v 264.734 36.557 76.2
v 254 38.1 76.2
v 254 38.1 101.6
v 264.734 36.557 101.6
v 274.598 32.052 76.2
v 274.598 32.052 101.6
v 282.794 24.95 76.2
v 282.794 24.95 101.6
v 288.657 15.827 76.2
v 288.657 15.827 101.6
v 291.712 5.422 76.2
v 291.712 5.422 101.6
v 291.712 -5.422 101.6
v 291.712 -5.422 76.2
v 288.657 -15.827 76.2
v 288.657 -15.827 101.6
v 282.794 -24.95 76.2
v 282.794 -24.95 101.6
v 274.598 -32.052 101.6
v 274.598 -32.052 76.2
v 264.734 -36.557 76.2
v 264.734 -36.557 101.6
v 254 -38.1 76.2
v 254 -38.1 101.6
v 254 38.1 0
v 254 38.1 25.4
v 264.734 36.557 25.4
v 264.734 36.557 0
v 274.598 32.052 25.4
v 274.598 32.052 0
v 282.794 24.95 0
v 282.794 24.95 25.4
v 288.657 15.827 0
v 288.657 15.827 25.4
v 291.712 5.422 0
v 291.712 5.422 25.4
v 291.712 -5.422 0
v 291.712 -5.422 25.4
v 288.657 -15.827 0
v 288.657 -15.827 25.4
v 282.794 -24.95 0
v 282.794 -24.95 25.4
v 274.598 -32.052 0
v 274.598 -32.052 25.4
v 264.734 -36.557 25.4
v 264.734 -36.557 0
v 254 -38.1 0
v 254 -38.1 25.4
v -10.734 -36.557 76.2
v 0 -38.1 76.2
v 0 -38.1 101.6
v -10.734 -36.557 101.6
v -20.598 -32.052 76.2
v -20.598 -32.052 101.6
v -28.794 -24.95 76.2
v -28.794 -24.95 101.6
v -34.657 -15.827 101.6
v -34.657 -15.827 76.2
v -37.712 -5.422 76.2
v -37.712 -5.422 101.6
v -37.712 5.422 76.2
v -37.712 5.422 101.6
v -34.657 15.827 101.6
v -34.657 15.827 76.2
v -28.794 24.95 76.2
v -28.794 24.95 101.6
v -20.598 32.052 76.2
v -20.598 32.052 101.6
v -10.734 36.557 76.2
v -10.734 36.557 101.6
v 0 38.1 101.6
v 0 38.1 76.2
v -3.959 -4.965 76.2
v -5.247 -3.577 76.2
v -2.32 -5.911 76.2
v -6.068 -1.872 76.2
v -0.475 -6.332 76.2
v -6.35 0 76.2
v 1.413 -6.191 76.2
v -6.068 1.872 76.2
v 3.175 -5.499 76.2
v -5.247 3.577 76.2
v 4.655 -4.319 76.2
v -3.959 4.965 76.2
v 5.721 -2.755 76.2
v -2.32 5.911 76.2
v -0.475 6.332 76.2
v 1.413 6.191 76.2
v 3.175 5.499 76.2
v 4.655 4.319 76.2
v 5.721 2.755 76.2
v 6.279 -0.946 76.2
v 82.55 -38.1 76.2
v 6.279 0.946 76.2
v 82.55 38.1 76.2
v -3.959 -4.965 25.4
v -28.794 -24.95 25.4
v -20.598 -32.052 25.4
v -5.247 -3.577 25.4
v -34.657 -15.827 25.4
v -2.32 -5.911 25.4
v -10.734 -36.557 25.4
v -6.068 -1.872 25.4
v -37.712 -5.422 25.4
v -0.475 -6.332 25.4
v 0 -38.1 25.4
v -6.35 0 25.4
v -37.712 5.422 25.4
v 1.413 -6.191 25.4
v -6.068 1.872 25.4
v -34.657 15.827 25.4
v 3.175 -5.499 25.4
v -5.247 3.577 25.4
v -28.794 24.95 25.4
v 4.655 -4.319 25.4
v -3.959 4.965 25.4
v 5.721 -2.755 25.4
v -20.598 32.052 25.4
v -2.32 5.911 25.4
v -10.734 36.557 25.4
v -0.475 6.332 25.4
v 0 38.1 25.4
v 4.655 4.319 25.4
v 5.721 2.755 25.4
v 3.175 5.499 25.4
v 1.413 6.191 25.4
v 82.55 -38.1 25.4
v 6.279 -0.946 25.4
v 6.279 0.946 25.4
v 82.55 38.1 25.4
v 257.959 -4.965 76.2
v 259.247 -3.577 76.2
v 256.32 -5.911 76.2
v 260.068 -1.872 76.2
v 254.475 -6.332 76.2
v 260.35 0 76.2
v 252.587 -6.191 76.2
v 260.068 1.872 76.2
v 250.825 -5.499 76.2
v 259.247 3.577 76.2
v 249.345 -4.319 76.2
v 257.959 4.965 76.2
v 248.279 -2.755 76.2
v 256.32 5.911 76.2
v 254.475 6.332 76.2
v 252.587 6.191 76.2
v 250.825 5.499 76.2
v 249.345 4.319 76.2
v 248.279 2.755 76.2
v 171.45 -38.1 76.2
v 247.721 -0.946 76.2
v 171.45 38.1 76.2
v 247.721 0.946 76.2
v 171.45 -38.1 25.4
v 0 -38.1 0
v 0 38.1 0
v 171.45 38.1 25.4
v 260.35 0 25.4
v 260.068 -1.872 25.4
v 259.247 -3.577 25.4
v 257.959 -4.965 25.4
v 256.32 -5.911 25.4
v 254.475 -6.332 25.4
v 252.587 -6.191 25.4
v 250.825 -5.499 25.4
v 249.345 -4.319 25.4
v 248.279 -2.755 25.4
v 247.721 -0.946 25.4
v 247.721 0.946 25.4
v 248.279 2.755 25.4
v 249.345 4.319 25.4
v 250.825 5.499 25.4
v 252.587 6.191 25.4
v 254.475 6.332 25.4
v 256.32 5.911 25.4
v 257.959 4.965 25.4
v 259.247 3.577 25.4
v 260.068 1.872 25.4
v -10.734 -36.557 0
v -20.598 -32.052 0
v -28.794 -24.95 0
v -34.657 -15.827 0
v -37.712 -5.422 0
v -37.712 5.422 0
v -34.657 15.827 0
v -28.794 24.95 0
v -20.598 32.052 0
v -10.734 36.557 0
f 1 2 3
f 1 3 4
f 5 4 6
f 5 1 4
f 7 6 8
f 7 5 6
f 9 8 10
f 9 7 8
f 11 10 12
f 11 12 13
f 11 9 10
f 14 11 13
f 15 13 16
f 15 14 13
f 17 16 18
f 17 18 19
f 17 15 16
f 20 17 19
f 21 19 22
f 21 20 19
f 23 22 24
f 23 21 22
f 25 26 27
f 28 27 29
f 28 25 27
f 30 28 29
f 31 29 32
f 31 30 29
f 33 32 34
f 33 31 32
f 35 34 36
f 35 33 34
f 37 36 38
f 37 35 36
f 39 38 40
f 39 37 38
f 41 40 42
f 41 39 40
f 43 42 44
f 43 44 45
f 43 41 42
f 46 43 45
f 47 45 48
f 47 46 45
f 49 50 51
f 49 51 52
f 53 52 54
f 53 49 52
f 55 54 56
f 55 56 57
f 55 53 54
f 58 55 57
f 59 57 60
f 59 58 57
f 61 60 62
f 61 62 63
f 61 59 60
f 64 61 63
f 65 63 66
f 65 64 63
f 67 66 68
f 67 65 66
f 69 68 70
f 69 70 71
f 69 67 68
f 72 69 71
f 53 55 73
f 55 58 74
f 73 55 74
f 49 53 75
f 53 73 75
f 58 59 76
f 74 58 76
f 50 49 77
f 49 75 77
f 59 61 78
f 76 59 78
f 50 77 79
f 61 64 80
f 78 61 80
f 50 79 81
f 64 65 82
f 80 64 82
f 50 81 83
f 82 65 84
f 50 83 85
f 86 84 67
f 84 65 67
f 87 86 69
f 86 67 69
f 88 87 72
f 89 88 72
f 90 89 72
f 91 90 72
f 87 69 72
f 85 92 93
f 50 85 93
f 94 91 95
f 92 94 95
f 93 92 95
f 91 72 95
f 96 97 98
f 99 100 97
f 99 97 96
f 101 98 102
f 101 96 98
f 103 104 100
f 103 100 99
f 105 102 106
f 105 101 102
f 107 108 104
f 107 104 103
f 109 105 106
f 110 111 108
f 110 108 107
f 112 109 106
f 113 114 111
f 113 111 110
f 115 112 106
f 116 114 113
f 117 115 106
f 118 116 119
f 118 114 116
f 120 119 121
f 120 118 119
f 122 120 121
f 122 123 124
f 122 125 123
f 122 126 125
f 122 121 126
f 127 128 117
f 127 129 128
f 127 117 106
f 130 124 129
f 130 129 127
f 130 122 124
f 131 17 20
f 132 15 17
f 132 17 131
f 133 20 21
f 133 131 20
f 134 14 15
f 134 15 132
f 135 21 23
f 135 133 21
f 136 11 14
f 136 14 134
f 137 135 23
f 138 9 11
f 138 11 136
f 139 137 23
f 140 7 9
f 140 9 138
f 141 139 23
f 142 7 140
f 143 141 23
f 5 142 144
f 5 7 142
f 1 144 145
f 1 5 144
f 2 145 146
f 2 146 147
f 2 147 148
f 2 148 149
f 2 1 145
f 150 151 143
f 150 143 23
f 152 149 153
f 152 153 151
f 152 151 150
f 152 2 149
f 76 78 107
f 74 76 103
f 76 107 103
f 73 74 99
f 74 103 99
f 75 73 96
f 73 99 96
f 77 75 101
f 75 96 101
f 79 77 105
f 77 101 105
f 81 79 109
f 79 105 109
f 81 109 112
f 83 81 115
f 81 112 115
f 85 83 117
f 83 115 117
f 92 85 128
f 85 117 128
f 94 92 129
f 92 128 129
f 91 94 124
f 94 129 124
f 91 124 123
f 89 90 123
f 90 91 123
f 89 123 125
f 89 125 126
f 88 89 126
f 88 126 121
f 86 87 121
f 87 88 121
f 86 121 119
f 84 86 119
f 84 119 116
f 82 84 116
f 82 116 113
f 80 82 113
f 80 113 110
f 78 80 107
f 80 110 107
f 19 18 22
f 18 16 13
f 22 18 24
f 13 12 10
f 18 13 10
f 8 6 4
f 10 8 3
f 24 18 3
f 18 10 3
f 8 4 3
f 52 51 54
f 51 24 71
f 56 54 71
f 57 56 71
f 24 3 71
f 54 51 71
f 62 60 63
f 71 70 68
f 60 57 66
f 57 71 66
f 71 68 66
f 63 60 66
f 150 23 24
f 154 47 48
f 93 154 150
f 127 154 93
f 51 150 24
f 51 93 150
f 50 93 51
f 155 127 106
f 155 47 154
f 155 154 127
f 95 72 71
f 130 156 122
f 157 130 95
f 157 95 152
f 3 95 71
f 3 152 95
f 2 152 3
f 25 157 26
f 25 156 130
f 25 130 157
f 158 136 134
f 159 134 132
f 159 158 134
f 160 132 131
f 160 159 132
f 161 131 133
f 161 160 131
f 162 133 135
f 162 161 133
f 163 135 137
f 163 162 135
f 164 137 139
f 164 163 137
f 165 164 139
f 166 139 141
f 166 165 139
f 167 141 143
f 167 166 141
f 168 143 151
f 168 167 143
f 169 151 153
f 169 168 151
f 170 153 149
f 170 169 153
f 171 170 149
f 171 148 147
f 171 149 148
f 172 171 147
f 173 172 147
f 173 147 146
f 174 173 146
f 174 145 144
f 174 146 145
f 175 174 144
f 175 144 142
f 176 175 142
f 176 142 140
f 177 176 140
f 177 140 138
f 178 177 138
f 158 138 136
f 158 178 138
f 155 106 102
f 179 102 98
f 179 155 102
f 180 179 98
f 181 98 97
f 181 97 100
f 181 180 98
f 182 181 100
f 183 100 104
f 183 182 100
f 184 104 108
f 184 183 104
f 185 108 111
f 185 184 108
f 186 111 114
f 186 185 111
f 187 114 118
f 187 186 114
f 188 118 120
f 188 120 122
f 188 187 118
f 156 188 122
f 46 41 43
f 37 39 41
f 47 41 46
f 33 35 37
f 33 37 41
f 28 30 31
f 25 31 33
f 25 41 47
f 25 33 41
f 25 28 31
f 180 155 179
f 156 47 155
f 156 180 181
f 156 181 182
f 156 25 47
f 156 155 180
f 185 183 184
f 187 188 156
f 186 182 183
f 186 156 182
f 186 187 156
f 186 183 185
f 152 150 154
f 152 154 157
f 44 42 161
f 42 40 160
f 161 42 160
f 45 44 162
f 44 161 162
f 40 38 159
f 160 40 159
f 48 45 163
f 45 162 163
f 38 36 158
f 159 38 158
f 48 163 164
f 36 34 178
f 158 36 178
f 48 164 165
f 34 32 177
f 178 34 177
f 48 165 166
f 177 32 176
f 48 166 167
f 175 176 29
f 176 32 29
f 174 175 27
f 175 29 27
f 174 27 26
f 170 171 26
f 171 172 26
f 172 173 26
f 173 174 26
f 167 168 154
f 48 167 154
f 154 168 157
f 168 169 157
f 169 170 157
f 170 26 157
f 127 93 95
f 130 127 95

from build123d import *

# Parameters (mm, degrees)
BOSS_EXTRUDE1_DEPTH = 101.6
CUT_EXTRUDE1_START  = -25.4
SKETCH3_W           = 165.1
SKETCH3_H           = 76.2
CUT_EXTRUDE1_DEPTH  = 50.8
BOSS_EXTRUDE2_REACH = 306.27
SKETCH6_R           = 6.35


with BuildPart() as part:
    # Sketch1 → Boss-Extrude1 (new body)
    with BuildSketch(Plane.XY):
        with BuildLine():
            Line((0, 38.1), (254, 38.1))
            ThreePointArc((254, 38.1), (292.1, 0), (254, -38.1))
            Line((254, -38.1), (0, -38.1))
            ThreePointArc((0, -38.1), (-38.1, 0), (0, 38.1))
        make_face()
    extrude(amount=BOSS_EXTRUDE1_DEPTH)

    # Sketch3 → Cut-Extrude1 (cut)
    with BuildSketch(Plane.XY.offset(101.6).offset(CUT_EXTRUDE1_START)):
        Rectangle(SKETCH3_W, SKETCH3_H)
    cut_extrude1 = extrude(amount=-CUT_EXTRUDE1_DEPTH, mode=Mode.SUBTRACT)

    # Mirror1: Cut-Extrude1 across plane
    add(cut_extrude1.mirror(Plane(origin=(127, 0, 0), x_dir=(0, 0, 1), z_dir=(1, 0, 0))), mode=Mode.SUBTRACT)

    # Sketch6 → Boss-Extrude2 (add, up to next)
    with BuildSketch(Plane.XY.offset(25.4), mode=Mode.PRIVATE) as boss_extrude2_sk1:
        with Locations(Location((0, 0, 0), (0, 0, 180))):
            Circle(SKETCH6_R)
    boss_extrude2_tool1 = extrude(boss_extrude2_sk1.sketch, amount=BOSS_EXTRUDE2_REACH, mode=Mode.PRIVATE) - part.part
    boss_extrude2 = boss_extrude2_tool1.solids().sort_by_distance((0, 0, 25.4))[0]
    add(boss_extrude2)

    # Mirror2: Boss-Extrude2 across plane
    add(boss_extrude2.mirror(Plane(origin=(127, 0, 0), x_dir=(0, 0, 1), z_dir=(1, 0, 0))))


solid = part.part
